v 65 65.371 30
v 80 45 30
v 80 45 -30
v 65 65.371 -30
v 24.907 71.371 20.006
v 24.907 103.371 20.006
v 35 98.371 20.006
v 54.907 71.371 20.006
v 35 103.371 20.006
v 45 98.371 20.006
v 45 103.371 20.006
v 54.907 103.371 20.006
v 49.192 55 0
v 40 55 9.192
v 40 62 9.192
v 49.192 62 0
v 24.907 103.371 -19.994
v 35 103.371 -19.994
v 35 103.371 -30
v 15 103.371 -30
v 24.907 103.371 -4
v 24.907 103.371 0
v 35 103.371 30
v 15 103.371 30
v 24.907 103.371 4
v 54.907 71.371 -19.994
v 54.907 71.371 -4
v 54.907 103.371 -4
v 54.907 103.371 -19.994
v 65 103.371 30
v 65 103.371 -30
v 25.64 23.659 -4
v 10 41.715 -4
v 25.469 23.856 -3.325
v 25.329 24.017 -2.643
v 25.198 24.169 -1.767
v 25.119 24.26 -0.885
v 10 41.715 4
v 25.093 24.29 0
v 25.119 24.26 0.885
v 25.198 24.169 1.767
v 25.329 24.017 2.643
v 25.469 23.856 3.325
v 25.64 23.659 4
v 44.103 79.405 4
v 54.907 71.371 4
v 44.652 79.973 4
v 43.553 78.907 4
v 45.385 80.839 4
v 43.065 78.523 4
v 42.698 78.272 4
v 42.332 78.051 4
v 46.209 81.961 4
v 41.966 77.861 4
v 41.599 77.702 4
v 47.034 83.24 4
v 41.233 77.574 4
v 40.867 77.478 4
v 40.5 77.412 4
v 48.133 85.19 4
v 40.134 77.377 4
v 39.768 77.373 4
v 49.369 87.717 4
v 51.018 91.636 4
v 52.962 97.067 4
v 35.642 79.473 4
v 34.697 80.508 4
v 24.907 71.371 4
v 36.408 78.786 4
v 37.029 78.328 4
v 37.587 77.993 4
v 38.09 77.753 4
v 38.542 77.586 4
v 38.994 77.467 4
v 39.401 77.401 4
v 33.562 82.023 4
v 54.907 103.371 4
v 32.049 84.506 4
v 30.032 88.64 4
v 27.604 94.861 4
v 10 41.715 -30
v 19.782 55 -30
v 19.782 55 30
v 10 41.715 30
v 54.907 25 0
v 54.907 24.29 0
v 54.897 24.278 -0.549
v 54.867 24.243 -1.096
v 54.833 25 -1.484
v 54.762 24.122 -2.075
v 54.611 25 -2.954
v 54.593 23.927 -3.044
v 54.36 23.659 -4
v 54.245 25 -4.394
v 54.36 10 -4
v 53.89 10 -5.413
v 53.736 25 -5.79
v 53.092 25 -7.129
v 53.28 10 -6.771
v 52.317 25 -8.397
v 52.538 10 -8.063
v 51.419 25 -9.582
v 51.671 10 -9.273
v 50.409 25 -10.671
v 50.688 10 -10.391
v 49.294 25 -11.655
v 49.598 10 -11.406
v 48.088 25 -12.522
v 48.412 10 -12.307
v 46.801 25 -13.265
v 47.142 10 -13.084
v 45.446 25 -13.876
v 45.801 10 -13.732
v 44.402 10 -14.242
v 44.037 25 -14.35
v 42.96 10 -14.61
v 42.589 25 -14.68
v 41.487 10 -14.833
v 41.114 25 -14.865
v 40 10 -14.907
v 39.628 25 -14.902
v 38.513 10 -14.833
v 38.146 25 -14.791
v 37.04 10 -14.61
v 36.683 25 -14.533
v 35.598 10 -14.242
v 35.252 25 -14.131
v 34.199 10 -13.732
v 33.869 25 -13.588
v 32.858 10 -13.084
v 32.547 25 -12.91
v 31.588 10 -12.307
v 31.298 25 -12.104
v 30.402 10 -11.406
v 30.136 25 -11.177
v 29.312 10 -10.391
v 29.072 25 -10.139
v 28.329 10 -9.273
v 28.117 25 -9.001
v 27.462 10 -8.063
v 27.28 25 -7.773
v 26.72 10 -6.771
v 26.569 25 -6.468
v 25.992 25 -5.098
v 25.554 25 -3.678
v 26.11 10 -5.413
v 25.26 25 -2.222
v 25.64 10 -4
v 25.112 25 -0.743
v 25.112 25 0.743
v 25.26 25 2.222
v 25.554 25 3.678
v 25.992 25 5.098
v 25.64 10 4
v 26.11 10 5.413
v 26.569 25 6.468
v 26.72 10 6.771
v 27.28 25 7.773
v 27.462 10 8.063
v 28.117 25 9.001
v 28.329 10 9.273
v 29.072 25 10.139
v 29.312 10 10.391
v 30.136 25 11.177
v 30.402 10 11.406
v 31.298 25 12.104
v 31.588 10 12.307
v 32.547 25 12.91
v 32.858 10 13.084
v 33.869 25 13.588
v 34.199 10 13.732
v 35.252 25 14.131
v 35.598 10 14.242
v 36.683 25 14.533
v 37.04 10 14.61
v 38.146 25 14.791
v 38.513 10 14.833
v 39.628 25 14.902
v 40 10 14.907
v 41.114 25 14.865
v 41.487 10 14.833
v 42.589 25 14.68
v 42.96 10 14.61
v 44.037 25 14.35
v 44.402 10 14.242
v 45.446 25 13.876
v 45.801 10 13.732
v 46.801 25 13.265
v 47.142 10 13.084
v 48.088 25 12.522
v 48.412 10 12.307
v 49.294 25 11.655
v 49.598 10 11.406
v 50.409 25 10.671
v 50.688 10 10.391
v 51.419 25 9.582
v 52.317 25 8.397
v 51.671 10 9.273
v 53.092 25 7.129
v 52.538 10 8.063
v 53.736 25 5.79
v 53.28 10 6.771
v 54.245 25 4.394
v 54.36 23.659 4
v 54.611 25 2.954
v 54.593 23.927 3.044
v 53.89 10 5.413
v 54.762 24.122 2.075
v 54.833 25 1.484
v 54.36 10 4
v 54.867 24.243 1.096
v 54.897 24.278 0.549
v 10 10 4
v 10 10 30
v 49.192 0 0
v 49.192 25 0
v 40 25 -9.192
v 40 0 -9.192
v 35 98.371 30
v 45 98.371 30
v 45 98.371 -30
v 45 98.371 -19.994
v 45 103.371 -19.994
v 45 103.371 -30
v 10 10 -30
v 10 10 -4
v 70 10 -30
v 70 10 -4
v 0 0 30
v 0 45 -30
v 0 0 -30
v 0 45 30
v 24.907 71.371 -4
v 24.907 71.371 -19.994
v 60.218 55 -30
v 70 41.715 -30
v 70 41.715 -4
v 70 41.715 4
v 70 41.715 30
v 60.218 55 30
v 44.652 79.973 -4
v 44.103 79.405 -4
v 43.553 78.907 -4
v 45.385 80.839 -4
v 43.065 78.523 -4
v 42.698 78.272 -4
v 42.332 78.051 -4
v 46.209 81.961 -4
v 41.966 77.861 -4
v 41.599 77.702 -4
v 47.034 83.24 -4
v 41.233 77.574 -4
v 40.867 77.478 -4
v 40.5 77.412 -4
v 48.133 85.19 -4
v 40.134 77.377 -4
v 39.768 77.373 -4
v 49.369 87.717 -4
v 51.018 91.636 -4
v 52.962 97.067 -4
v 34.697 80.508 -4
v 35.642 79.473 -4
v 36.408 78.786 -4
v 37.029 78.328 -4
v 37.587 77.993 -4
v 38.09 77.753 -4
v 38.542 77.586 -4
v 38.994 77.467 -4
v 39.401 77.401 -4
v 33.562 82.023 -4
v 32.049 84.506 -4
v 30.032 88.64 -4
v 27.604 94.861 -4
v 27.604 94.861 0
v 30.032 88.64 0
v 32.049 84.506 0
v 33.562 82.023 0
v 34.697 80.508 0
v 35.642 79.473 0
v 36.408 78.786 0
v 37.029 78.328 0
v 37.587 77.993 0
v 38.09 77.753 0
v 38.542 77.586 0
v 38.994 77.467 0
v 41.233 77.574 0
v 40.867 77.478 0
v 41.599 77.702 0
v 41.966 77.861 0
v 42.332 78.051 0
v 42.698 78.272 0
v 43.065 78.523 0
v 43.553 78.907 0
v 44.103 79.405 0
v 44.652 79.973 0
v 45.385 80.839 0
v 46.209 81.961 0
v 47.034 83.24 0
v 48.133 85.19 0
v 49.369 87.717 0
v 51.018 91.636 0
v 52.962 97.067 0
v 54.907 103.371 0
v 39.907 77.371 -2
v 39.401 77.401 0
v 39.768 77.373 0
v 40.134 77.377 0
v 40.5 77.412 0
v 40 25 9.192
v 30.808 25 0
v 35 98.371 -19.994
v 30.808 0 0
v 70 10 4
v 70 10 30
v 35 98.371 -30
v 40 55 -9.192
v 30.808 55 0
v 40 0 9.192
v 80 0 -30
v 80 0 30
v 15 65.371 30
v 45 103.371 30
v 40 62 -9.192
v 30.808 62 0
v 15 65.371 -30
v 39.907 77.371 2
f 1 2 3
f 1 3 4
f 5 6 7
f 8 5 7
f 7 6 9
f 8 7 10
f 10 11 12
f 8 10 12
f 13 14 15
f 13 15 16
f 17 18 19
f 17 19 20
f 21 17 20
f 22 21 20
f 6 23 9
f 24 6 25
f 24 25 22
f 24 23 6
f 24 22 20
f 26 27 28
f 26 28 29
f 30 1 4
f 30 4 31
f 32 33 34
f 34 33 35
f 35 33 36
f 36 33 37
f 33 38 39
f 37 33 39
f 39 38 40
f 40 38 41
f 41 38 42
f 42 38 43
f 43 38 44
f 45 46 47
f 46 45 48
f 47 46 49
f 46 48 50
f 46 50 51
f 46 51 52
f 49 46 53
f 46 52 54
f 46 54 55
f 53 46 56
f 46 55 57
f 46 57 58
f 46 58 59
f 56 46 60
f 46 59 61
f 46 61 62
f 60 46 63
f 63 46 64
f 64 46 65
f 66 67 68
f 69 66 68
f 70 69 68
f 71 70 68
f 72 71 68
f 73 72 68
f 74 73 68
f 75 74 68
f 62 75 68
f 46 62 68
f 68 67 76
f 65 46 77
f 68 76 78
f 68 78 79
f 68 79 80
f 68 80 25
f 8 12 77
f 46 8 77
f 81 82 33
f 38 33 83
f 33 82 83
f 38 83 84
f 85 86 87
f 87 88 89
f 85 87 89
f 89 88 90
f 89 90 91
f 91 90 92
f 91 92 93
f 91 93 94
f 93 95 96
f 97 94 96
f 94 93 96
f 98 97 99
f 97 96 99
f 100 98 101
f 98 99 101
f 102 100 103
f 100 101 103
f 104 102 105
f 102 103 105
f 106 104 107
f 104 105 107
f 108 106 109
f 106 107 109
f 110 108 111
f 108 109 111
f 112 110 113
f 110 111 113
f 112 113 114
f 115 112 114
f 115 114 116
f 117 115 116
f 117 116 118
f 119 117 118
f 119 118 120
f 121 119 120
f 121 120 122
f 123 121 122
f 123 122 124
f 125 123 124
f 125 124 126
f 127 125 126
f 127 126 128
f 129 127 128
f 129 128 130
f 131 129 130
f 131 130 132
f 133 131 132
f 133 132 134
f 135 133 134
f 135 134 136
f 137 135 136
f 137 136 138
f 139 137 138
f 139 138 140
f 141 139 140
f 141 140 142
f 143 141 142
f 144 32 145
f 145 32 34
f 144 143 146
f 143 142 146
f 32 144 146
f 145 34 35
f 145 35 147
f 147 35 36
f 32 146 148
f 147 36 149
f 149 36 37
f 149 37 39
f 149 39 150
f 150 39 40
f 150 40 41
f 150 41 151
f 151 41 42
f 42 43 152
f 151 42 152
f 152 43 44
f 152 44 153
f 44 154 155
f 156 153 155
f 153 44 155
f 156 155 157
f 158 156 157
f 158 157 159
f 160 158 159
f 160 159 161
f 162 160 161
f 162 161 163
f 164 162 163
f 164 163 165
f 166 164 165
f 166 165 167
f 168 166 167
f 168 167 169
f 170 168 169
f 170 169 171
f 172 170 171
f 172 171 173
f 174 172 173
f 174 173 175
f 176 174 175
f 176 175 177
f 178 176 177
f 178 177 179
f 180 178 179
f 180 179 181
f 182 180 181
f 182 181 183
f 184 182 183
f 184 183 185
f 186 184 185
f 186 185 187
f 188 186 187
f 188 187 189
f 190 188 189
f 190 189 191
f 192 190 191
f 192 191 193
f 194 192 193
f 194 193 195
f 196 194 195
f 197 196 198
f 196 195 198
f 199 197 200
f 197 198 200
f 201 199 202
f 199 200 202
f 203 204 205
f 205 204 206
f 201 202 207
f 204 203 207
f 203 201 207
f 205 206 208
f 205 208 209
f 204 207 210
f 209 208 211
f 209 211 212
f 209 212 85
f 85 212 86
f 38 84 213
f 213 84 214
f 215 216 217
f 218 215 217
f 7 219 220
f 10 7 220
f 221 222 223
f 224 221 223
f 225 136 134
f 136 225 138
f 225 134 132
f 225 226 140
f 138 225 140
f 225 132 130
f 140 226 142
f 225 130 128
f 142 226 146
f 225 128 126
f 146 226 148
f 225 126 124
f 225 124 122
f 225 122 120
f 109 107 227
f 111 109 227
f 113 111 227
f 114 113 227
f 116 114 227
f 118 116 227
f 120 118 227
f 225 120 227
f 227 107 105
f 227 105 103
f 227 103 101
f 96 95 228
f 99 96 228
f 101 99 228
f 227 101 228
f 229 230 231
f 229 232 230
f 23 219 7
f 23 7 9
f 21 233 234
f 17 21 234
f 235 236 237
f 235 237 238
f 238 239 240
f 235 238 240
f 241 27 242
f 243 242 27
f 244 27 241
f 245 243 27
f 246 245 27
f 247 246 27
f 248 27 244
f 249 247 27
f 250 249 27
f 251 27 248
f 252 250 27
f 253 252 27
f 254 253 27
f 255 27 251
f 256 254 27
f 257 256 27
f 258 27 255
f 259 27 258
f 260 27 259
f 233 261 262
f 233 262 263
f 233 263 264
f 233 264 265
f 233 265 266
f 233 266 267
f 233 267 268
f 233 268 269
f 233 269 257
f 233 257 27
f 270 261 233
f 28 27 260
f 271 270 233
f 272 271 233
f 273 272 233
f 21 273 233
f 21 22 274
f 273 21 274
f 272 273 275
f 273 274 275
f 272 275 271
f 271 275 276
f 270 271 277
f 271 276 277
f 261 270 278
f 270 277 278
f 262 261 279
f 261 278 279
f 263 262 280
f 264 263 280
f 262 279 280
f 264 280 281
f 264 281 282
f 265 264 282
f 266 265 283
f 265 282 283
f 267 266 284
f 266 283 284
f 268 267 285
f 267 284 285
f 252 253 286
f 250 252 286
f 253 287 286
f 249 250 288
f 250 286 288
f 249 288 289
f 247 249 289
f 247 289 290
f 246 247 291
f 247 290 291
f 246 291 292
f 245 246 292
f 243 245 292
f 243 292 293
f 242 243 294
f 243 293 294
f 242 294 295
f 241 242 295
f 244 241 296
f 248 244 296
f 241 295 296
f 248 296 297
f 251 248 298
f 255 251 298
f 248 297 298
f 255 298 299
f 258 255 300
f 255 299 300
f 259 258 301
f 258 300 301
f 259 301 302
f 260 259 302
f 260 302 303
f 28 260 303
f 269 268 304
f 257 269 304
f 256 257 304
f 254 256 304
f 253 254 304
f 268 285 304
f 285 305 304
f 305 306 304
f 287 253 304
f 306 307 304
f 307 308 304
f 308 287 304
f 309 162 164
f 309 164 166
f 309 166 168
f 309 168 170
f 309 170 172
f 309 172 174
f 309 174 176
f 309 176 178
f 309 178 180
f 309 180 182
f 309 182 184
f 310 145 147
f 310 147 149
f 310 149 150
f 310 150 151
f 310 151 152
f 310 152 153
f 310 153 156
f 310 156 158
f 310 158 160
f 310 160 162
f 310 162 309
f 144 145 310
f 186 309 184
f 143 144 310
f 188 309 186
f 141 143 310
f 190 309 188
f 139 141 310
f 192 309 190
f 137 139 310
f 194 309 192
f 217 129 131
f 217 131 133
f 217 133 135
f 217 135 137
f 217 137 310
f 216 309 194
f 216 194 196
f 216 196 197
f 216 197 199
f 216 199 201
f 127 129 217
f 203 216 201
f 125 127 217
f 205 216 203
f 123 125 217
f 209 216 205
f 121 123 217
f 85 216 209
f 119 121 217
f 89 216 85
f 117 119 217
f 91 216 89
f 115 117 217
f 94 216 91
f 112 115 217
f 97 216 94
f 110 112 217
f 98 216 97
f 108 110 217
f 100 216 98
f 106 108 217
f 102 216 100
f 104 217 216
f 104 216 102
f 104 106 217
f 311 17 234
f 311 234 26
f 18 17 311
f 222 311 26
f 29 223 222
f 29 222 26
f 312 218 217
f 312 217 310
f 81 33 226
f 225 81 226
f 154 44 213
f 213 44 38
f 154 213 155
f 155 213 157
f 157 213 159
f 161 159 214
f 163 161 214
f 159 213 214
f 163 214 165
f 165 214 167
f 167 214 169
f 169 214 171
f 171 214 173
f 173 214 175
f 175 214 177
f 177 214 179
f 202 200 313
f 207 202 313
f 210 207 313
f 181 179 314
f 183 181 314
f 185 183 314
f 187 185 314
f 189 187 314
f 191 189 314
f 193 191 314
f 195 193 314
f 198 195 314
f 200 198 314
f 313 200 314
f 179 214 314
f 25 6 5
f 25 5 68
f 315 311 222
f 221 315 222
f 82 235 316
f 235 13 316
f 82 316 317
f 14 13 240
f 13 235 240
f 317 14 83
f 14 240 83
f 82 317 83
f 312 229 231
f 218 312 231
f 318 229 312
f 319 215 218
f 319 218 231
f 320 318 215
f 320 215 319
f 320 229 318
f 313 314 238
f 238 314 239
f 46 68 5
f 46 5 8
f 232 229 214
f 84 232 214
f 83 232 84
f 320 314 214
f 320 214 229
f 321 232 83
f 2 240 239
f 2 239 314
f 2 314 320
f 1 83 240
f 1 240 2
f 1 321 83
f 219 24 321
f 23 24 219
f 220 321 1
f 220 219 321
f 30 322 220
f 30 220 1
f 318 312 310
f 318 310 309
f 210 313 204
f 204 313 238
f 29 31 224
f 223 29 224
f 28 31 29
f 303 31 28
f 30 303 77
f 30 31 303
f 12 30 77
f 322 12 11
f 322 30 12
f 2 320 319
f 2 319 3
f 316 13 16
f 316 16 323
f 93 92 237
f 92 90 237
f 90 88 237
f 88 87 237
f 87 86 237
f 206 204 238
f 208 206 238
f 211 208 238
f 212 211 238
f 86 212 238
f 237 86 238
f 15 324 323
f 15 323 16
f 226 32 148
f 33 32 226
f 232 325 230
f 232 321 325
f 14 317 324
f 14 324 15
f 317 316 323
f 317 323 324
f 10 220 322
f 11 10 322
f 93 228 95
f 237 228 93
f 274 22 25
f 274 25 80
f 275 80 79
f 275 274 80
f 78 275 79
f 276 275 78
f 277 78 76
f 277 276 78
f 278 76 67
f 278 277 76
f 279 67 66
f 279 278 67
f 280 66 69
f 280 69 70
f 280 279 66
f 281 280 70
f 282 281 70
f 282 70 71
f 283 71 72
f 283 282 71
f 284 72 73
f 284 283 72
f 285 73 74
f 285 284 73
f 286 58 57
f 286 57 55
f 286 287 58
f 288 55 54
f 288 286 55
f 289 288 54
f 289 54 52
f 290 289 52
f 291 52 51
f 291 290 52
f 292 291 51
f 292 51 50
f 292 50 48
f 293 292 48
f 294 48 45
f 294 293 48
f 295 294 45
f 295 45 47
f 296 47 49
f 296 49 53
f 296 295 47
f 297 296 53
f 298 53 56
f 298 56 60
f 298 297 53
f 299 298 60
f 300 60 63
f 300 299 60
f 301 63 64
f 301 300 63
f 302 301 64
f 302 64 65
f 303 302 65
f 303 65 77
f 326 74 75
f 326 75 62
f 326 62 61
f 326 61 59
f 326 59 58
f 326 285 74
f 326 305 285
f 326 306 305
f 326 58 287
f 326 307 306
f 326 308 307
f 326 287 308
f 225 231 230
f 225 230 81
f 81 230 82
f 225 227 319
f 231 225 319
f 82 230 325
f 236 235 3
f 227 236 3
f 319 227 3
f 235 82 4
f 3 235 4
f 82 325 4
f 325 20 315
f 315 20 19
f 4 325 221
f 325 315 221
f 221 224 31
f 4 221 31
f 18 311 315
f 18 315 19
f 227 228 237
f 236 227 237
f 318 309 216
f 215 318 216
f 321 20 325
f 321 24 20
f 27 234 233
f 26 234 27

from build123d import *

# Parameters (mm, degrees)
EXTRUDE_1_DEPTH          = 30
EXTRUDE_1_DEPTH_BACK     = 30
SKETCH_2_W               = 30
SKETCH_2_H               = 40
CUT_EXTRUDE_1_DEPTH      = 32
SKETCH_3_W               = 10
SKETCH_3_H               = 10
CUT_EXTRUDE_2_DEPTH      = 61
SKETCH_4_R               = 14.906957443
EXTRUDE_2_DEPTH          = 15
CUT_EXTRUDE_3_DEPTH      = 37
CUT_EXTRUDE_3_DEPTH_BACK = 26
EXTRUDE_3_DEPTH          = 4
EXTRUDE_3_DEPTH_BACK     = 4
EXTRUDE_4_DEPTH          = 4
EXTRUDE_4_DEPTH_BACK     = 4


with BuildPart() as part:
    # Эскиз1 → Бобышка-Вытянуть1 (new body, two sides)
    with BuildSketch(Plane.XY) as extrude_1_sk:
        Polygon((0, 0), (80, 0), (80, 45), (65, 65.371127092), (65, 103.371127092), (40, 103.371127092), (15, 103.371127092), (15, 65.371127092), (0, 45), align=None)
        Polygon((10, 10), (70, 10), (70, 41.715496922), (60.218138384, 55), (19.781861616, 55), (10, 41.715496922), align=None, mode=Mode.SUBTRACT)
    extrude(amount=EXTRUDE_1_DEPTH)
    extrude(extrude_1_sk.sketch, amount=-EXTRUDE_1_DEPTH_BACK)

    # Эскиз2 → Вырез-Вытянуть1 (cut)
    with BuildSketch(Plane(origin=(0, 103.371127092, 0), x_dir=(1, 0, 0), z_dir=(0, 1, 0))):
        with Locations((39.906957443, -0.006497208)):
            Rectangle(SKETCH_2_W, SKETCH_2_H)
    extrude(amount=-CUT_EXTRUDE_1_DEPTH, mode=Mode.SUBTRACT)

    # Эскиз3 → Вырез-Вытянуть2 (cut, through all)
    with BuildSketch(Plane.XY.offset(30)):
        with Locations((40, 103.371127092)):
            Rectangle(SKETCH_3_W, SKETCH_3_H)
    extrude(amount=-CUT_EXTRUDE_2_DEPTH, mode=Mode.SUBTRACT)

    # Эскиз4 → Бобышка-Вытянуть2 (add)
    with BuildSketch(Plane(origin=(0, 10, 0), x_dir=(1, 0, 0), z_dir=(0, 1, 0))):
        with Locations((40, 0)):
            Circle(SKETCH_4_R)
    extrude(amount=EXTRUDE_2_DEPTH)

    # Эскиз5 → Вырез-Вытянуть3 (cut, two sides)
    with BuildSketch(Plane(origin=(0, 25, 0), x_dir=(1, 0, 0), z_dir=(0, 1, 0))) as cut_extrude_3_sk:
        Polygon((40, 9.192388155), (30.807611845, 0), (40, -9.192388155), (49.192388155, 0), align=None)
    extrude(amount=CUT_EXTRUDE_3_DEPTH, mode=Mode.SUBTRACT)
    extrude(cut_extrude_3_sk.sketch, amount=-CUT_EXTRUDE_3_DEPTH_BACK, mode=Mode.SUBTRACT)

    # Эскиз6 → Бобышка-Вытянуть3 (add, two sides)
    with BuildSketch(Plane.XY) as extrude_3_sk:
        Polygon((70, 10), (51.541791272, 10), (51.541791272, 20.404686065), (70, 41.715496922), align=None)
        Polygon((10, 10), (10, 41.715496922), (28.458208728, 20.404686065), (28.458208728, 10), align=None)
    extrude(amount=EXTRUDE_3_DEPTH)
    extrude(extrude_3_sk.sketch, amount=-EXTRUDE_3_DEPTH_BACK)

    # Эскиз8 → Бобышка-Вытянуть4 (add, two sides)
    with BuildSketch(Plane.XY) as extrude_4_sk:
        with BuildLine():
            Line((54.906957443, 103.371127092), (54.906957443, 77.371127092))
            Line((54.906957443, 77.371127092), (54.906957443, 71.371127092))
            Line((54.906957443, 71.371127092), (24.906957443, 71.371127092))
            Line((24.906957443, 71.371127092), (24.906957443, 77.371127092))
            Line((24.906957443, 77.371127092), (24.906957443, 103.371127092))
            add(Edge.make_bspline(
                [(24.906957443, 103.371127092), (39.906957443, 51.371127092), (54.906957443, 103.371127092)],
                knots=[0, 0, 0, 1, 1, 1], degree=2))
        make_face()
    extrude(amount=EXTRUDE_4_DEPTH)
    extrude(extrude_4_sk.sketch, amount=-EXTRUDE_4_DEPTH_BACK)


solid = part.part
